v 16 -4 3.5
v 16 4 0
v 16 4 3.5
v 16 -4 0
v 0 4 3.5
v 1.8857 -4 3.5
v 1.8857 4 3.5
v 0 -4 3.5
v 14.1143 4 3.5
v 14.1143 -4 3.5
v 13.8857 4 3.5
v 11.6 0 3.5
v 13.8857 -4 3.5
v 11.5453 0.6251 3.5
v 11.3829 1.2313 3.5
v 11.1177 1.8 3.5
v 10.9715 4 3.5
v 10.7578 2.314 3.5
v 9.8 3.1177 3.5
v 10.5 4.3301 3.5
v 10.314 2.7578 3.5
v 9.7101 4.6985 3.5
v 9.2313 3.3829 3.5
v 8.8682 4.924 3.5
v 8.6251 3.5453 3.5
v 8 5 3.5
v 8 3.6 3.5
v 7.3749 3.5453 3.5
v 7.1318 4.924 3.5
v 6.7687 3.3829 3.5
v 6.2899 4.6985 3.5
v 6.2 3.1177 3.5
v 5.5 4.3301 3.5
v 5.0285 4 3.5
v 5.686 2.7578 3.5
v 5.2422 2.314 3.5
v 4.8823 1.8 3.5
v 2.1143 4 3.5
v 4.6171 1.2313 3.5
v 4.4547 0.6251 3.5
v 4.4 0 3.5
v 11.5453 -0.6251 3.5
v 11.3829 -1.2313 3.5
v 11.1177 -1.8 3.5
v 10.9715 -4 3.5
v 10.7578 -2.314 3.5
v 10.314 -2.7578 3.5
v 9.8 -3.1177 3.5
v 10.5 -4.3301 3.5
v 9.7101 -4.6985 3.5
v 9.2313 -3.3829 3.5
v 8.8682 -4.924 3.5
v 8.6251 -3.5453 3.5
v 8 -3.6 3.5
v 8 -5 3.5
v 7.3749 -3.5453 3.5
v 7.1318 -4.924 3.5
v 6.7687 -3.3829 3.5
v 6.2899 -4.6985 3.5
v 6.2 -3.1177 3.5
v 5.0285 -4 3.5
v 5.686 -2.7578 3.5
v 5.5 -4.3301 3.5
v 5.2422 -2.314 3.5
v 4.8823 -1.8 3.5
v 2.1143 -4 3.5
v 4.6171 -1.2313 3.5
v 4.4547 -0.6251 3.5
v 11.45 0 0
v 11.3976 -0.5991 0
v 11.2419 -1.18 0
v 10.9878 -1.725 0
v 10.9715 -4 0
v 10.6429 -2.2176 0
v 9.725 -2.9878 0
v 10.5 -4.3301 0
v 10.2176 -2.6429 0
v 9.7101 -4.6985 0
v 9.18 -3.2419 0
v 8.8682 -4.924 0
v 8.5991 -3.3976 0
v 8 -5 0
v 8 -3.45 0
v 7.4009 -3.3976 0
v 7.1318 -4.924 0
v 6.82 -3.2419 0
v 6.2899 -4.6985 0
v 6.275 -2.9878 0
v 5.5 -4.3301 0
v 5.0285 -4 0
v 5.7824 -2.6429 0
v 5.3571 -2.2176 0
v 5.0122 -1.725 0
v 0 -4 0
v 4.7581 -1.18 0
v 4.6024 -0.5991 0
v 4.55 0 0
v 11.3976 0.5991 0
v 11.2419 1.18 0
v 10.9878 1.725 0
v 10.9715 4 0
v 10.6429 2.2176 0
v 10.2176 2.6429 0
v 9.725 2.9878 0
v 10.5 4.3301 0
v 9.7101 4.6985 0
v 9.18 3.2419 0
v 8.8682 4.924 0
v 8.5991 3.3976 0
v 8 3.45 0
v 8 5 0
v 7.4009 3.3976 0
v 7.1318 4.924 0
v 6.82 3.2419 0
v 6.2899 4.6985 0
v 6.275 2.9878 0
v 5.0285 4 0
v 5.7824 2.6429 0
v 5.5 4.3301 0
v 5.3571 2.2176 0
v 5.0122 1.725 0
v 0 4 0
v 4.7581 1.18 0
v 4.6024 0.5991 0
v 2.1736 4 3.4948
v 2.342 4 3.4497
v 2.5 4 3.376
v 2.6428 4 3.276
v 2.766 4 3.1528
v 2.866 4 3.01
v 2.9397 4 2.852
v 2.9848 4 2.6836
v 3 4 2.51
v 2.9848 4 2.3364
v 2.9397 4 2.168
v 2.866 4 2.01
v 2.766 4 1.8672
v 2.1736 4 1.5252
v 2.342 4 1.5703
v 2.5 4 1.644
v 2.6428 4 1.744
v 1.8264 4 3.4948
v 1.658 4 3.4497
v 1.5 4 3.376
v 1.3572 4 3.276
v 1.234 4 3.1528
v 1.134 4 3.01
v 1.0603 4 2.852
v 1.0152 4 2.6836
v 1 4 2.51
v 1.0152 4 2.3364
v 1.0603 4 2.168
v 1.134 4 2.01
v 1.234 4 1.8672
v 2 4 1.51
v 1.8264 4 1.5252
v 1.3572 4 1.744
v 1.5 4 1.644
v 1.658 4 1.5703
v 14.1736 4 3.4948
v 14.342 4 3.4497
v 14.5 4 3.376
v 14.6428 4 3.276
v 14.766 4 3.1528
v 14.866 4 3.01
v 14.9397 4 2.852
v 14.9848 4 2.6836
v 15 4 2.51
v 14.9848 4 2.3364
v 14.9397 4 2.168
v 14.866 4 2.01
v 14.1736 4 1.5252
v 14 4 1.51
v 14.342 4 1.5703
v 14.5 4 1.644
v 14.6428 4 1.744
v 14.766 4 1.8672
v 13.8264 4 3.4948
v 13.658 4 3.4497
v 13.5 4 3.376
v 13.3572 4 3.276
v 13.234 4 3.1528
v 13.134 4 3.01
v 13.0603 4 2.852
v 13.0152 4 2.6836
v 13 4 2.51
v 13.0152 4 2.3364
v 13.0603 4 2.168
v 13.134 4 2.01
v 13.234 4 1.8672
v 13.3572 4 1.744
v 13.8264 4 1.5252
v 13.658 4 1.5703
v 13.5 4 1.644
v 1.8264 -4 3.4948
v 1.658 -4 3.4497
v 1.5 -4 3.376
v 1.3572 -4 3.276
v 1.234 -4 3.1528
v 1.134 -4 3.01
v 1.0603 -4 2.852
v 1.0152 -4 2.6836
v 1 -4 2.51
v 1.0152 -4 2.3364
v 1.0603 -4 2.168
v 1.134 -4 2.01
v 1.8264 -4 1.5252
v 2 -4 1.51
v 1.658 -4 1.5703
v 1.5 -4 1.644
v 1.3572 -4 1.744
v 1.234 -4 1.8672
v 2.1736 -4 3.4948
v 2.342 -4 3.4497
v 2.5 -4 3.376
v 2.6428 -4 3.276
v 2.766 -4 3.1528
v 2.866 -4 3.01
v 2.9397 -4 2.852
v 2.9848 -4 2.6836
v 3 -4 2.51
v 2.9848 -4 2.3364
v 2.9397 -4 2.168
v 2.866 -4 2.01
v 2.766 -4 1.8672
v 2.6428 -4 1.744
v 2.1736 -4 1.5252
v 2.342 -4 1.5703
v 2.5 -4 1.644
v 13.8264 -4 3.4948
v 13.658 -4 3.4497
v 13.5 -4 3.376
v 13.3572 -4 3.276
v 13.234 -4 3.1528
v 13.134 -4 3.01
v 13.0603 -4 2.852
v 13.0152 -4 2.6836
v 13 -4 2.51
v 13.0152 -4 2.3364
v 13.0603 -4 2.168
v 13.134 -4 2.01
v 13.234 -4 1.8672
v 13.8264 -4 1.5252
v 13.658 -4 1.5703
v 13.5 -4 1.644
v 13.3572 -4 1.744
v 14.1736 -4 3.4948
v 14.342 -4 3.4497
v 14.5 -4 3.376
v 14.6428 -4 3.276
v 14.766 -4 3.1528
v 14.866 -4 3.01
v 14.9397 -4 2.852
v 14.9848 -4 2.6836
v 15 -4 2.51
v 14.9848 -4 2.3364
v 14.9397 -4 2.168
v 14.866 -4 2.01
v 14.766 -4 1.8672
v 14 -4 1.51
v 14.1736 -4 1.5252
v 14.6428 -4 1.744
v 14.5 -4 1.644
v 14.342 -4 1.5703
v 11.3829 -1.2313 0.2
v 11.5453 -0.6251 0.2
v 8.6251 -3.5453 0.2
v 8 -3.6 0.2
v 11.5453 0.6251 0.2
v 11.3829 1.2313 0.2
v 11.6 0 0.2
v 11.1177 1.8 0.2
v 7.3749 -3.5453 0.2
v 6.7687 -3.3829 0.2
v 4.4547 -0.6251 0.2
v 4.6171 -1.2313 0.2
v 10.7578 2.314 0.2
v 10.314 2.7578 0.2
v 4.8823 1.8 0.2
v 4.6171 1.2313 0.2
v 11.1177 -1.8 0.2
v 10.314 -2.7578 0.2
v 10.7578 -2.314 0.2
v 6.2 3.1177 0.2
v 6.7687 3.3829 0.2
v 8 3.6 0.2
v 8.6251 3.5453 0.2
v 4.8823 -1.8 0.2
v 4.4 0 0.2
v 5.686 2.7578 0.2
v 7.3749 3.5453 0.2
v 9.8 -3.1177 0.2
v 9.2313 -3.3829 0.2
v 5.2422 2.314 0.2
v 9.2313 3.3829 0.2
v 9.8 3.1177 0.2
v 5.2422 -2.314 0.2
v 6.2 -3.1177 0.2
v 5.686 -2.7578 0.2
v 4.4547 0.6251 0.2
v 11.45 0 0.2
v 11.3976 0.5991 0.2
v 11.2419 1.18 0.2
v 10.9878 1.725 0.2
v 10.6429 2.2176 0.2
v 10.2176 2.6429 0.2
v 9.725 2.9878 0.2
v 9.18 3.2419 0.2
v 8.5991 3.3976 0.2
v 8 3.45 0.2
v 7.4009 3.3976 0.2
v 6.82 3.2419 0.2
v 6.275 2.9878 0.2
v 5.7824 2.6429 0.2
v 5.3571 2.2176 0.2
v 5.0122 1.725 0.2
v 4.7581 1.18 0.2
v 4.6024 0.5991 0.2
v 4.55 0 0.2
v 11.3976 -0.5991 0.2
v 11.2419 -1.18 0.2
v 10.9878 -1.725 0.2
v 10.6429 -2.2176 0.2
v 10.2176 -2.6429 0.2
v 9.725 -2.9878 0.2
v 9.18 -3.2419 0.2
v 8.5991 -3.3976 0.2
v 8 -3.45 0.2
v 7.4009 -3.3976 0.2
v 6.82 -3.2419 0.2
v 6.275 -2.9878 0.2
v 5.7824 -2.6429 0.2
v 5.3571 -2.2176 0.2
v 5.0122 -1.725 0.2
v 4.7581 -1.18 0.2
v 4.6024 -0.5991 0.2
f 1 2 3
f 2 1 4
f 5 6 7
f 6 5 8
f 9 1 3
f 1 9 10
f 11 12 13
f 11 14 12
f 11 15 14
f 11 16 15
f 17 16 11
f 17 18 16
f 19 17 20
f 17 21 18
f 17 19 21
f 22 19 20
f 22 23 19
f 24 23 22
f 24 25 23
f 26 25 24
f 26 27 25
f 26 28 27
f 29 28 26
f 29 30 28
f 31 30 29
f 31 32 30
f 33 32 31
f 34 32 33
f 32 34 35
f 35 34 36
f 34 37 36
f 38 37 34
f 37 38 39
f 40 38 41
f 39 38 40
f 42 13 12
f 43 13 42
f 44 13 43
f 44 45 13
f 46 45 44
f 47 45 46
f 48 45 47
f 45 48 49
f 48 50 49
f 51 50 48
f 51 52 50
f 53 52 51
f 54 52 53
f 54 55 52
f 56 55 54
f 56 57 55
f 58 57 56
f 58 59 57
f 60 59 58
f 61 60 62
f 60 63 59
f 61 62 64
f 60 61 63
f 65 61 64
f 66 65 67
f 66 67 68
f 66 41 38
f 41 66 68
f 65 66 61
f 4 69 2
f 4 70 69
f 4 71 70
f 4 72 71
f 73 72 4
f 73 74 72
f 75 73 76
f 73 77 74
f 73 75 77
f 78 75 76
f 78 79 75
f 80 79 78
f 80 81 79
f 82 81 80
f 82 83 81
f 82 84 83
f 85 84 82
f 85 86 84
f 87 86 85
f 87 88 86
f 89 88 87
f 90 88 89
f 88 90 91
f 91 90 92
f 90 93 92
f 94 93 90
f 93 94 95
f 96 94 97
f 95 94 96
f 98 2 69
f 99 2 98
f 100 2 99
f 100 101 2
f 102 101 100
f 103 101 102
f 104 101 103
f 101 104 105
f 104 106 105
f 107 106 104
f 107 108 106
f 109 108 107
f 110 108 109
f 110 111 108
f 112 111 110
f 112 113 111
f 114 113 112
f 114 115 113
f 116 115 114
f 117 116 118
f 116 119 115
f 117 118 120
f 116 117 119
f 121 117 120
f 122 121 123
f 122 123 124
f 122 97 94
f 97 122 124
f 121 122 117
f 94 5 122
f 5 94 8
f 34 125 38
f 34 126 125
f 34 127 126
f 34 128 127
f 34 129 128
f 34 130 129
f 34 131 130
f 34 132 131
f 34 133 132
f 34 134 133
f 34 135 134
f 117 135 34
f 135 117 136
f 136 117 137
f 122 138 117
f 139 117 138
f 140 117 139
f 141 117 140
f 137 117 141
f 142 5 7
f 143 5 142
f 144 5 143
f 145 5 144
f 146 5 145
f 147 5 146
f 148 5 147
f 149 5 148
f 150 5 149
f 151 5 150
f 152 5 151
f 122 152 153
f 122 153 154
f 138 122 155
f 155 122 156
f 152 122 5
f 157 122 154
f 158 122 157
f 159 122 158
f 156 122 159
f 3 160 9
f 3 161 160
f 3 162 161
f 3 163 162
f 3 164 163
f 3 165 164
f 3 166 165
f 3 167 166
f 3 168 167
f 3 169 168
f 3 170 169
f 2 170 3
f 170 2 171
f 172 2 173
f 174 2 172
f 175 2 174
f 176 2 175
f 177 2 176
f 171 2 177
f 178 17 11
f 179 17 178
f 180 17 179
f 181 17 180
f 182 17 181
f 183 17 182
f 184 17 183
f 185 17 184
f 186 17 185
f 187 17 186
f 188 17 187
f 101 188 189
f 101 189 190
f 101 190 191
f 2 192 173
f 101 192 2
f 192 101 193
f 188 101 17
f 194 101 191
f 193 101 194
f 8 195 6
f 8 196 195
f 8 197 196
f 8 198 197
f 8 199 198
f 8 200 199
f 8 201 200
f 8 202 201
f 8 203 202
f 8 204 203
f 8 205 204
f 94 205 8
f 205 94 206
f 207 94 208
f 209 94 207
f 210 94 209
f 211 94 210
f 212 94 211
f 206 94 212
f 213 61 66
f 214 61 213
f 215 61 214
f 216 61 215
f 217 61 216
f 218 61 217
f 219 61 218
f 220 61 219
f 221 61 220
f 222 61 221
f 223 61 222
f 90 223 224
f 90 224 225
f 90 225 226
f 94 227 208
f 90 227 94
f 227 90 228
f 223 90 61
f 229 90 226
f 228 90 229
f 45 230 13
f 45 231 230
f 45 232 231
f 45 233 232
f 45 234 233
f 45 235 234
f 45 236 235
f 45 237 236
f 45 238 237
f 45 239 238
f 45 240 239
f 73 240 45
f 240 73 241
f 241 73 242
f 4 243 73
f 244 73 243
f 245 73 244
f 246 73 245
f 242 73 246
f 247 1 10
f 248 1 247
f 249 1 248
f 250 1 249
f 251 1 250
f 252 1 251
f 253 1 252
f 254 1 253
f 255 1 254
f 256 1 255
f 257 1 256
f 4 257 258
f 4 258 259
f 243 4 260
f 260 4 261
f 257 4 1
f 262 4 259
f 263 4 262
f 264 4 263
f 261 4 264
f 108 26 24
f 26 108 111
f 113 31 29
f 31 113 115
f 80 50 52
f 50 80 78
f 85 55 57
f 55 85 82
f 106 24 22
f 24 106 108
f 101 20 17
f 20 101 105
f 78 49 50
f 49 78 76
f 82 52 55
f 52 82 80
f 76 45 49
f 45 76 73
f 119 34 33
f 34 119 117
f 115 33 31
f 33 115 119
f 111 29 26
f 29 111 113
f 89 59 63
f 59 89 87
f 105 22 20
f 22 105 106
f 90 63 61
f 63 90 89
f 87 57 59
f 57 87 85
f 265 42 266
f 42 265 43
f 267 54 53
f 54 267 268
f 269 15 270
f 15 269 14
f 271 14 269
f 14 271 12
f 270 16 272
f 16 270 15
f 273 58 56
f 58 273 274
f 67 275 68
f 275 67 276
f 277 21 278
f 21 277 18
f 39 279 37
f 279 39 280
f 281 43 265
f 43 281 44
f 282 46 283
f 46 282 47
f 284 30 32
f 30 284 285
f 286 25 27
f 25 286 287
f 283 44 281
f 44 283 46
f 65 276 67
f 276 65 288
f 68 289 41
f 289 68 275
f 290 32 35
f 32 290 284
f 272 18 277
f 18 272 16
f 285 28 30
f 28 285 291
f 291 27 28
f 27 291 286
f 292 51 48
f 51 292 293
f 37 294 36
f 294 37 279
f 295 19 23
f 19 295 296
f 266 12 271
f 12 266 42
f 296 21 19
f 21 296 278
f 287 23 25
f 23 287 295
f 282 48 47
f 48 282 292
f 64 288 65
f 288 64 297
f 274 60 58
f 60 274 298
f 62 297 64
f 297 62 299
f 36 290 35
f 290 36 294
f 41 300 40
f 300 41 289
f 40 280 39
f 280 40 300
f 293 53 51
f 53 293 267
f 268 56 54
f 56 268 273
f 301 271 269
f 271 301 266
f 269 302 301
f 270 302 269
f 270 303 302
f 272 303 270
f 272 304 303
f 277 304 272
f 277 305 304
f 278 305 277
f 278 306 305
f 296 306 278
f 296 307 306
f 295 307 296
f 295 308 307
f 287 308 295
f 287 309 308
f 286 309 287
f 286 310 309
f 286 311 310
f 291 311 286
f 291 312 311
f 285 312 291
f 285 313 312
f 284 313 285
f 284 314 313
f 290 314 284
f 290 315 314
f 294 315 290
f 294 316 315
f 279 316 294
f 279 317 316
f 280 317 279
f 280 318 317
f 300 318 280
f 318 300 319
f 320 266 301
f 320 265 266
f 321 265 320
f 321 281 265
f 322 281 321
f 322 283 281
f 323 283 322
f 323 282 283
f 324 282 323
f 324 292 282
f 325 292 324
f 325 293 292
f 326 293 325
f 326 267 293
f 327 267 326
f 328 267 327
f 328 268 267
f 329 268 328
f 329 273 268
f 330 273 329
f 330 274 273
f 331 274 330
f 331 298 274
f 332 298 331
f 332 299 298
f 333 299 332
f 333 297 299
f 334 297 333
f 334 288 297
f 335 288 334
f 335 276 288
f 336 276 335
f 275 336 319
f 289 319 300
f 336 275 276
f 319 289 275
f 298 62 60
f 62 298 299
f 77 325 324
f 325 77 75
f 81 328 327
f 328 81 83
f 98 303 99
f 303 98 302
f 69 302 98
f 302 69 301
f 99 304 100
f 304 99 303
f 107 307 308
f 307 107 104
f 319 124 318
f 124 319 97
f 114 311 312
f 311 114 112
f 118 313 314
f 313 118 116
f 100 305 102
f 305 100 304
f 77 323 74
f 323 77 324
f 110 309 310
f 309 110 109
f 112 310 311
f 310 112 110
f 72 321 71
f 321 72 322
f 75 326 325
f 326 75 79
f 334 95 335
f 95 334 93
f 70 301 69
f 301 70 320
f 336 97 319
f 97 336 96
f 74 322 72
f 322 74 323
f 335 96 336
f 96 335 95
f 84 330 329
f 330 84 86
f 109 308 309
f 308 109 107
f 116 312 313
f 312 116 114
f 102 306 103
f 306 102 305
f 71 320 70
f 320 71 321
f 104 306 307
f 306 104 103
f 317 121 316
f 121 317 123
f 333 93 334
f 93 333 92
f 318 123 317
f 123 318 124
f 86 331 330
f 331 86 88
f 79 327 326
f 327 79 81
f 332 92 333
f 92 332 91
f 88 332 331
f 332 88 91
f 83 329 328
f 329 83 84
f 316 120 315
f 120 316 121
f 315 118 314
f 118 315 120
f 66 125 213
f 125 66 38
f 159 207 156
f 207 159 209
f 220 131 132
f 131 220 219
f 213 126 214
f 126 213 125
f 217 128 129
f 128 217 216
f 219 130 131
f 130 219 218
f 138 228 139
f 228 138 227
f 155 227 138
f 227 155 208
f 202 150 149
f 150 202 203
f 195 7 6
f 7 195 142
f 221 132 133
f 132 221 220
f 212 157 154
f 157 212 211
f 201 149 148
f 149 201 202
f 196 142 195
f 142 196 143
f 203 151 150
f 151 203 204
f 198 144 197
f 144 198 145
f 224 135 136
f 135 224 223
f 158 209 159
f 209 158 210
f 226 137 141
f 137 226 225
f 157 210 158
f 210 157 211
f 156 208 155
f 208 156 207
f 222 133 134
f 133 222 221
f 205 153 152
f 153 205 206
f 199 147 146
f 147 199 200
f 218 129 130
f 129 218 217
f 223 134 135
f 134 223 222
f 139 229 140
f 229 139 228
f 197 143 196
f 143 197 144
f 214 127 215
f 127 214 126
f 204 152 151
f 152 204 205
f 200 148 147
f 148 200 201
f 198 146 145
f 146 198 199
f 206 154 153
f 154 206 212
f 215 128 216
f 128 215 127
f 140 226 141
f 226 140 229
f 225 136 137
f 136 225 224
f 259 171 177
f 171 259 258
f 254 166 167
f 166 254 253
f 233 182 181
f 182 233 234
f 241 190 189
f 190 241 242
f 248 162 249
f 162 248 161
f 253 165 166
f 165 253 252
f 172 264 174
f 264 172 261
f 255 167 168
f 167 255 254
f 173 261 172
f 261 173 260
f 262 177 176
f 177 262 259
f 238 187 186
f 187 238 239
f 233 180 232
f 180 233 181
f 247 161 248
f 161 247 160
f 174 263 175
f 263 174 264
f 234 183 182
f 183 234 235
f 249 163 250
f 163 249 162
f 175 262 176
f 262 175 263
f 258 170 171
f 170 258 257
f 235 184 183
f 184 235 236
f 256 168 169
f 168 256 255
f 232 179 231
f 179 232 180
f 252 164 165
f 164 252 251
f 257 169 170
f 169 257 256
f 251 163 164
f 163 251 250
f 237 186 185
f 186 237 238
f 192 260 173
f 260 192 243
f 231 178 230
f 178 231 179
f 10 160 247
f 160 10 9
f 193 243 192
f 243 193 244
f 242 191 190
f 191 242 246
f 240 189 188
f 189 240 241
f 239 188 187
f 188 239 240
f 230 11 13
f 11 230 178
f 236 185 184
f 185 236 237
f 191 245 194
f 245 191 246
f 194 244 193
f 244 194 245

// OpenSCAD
// Customizable Simple Macro Lens Holder 
// preview[view:south, tilt:top];
/* [Parameters] */
lens_diameter = 7;

holder_height = 3.5;

rubber_band_hole_diameter = 2;



/* [Hidden] */
rubber_holder_width = 8;


module base() {        
    union() {
        translate([0, rubber_holder_width/-2, 0]) 
        cube([lens_diameter+3+rubber_band_hole_diameter*3,rubber_holder_width, holder_height]);        
        translate([(lens_diameter+3+rubber_band_hole_diameter*3)/2, 0, 0])
        cylinder(h=holder_height, r=(lens_diameter+3)/2, $fn=36);
    }
}
module holder() {
    difference() {
        base();
        
        translate([(lens_diameter+3+rubber_band_hole_diameter*3)/2, 0, 0.2])
        cylinder(h=holder_height, r=(lens_diameter+0.2)/2, $fn=36);
        
        translate([(lens_diameter+3+rubber_band_hole_diameter*3)/2, 0, -0.2])
        cylinder(h=holder_height, r=(lens_diameter-0.1)/2, $fn=36);
    
        translate([rubber_band_hole_diameter, (rubber_holder_width+1)/2, holder_height-rubber_band_hole_diameter/2+0.01]) rotate(a=[90,0,0]) 
        cylinder(h=rubber_holder_width+1, d=rubber_band_hole_diameter, $fn=36);
        

        translate([lens_diameter+3+rubber_band_hole_diameter*2, (rubber_holder_width+1)/2, holder_height-rubber_band_hole_diameter/2+0.01]) rotate(a=[90,0,0]) 
        cylinder(h=rubber_holder_width+1, d=rubber_band_hole_diameter, $fn=36);
    }
}

holder();
